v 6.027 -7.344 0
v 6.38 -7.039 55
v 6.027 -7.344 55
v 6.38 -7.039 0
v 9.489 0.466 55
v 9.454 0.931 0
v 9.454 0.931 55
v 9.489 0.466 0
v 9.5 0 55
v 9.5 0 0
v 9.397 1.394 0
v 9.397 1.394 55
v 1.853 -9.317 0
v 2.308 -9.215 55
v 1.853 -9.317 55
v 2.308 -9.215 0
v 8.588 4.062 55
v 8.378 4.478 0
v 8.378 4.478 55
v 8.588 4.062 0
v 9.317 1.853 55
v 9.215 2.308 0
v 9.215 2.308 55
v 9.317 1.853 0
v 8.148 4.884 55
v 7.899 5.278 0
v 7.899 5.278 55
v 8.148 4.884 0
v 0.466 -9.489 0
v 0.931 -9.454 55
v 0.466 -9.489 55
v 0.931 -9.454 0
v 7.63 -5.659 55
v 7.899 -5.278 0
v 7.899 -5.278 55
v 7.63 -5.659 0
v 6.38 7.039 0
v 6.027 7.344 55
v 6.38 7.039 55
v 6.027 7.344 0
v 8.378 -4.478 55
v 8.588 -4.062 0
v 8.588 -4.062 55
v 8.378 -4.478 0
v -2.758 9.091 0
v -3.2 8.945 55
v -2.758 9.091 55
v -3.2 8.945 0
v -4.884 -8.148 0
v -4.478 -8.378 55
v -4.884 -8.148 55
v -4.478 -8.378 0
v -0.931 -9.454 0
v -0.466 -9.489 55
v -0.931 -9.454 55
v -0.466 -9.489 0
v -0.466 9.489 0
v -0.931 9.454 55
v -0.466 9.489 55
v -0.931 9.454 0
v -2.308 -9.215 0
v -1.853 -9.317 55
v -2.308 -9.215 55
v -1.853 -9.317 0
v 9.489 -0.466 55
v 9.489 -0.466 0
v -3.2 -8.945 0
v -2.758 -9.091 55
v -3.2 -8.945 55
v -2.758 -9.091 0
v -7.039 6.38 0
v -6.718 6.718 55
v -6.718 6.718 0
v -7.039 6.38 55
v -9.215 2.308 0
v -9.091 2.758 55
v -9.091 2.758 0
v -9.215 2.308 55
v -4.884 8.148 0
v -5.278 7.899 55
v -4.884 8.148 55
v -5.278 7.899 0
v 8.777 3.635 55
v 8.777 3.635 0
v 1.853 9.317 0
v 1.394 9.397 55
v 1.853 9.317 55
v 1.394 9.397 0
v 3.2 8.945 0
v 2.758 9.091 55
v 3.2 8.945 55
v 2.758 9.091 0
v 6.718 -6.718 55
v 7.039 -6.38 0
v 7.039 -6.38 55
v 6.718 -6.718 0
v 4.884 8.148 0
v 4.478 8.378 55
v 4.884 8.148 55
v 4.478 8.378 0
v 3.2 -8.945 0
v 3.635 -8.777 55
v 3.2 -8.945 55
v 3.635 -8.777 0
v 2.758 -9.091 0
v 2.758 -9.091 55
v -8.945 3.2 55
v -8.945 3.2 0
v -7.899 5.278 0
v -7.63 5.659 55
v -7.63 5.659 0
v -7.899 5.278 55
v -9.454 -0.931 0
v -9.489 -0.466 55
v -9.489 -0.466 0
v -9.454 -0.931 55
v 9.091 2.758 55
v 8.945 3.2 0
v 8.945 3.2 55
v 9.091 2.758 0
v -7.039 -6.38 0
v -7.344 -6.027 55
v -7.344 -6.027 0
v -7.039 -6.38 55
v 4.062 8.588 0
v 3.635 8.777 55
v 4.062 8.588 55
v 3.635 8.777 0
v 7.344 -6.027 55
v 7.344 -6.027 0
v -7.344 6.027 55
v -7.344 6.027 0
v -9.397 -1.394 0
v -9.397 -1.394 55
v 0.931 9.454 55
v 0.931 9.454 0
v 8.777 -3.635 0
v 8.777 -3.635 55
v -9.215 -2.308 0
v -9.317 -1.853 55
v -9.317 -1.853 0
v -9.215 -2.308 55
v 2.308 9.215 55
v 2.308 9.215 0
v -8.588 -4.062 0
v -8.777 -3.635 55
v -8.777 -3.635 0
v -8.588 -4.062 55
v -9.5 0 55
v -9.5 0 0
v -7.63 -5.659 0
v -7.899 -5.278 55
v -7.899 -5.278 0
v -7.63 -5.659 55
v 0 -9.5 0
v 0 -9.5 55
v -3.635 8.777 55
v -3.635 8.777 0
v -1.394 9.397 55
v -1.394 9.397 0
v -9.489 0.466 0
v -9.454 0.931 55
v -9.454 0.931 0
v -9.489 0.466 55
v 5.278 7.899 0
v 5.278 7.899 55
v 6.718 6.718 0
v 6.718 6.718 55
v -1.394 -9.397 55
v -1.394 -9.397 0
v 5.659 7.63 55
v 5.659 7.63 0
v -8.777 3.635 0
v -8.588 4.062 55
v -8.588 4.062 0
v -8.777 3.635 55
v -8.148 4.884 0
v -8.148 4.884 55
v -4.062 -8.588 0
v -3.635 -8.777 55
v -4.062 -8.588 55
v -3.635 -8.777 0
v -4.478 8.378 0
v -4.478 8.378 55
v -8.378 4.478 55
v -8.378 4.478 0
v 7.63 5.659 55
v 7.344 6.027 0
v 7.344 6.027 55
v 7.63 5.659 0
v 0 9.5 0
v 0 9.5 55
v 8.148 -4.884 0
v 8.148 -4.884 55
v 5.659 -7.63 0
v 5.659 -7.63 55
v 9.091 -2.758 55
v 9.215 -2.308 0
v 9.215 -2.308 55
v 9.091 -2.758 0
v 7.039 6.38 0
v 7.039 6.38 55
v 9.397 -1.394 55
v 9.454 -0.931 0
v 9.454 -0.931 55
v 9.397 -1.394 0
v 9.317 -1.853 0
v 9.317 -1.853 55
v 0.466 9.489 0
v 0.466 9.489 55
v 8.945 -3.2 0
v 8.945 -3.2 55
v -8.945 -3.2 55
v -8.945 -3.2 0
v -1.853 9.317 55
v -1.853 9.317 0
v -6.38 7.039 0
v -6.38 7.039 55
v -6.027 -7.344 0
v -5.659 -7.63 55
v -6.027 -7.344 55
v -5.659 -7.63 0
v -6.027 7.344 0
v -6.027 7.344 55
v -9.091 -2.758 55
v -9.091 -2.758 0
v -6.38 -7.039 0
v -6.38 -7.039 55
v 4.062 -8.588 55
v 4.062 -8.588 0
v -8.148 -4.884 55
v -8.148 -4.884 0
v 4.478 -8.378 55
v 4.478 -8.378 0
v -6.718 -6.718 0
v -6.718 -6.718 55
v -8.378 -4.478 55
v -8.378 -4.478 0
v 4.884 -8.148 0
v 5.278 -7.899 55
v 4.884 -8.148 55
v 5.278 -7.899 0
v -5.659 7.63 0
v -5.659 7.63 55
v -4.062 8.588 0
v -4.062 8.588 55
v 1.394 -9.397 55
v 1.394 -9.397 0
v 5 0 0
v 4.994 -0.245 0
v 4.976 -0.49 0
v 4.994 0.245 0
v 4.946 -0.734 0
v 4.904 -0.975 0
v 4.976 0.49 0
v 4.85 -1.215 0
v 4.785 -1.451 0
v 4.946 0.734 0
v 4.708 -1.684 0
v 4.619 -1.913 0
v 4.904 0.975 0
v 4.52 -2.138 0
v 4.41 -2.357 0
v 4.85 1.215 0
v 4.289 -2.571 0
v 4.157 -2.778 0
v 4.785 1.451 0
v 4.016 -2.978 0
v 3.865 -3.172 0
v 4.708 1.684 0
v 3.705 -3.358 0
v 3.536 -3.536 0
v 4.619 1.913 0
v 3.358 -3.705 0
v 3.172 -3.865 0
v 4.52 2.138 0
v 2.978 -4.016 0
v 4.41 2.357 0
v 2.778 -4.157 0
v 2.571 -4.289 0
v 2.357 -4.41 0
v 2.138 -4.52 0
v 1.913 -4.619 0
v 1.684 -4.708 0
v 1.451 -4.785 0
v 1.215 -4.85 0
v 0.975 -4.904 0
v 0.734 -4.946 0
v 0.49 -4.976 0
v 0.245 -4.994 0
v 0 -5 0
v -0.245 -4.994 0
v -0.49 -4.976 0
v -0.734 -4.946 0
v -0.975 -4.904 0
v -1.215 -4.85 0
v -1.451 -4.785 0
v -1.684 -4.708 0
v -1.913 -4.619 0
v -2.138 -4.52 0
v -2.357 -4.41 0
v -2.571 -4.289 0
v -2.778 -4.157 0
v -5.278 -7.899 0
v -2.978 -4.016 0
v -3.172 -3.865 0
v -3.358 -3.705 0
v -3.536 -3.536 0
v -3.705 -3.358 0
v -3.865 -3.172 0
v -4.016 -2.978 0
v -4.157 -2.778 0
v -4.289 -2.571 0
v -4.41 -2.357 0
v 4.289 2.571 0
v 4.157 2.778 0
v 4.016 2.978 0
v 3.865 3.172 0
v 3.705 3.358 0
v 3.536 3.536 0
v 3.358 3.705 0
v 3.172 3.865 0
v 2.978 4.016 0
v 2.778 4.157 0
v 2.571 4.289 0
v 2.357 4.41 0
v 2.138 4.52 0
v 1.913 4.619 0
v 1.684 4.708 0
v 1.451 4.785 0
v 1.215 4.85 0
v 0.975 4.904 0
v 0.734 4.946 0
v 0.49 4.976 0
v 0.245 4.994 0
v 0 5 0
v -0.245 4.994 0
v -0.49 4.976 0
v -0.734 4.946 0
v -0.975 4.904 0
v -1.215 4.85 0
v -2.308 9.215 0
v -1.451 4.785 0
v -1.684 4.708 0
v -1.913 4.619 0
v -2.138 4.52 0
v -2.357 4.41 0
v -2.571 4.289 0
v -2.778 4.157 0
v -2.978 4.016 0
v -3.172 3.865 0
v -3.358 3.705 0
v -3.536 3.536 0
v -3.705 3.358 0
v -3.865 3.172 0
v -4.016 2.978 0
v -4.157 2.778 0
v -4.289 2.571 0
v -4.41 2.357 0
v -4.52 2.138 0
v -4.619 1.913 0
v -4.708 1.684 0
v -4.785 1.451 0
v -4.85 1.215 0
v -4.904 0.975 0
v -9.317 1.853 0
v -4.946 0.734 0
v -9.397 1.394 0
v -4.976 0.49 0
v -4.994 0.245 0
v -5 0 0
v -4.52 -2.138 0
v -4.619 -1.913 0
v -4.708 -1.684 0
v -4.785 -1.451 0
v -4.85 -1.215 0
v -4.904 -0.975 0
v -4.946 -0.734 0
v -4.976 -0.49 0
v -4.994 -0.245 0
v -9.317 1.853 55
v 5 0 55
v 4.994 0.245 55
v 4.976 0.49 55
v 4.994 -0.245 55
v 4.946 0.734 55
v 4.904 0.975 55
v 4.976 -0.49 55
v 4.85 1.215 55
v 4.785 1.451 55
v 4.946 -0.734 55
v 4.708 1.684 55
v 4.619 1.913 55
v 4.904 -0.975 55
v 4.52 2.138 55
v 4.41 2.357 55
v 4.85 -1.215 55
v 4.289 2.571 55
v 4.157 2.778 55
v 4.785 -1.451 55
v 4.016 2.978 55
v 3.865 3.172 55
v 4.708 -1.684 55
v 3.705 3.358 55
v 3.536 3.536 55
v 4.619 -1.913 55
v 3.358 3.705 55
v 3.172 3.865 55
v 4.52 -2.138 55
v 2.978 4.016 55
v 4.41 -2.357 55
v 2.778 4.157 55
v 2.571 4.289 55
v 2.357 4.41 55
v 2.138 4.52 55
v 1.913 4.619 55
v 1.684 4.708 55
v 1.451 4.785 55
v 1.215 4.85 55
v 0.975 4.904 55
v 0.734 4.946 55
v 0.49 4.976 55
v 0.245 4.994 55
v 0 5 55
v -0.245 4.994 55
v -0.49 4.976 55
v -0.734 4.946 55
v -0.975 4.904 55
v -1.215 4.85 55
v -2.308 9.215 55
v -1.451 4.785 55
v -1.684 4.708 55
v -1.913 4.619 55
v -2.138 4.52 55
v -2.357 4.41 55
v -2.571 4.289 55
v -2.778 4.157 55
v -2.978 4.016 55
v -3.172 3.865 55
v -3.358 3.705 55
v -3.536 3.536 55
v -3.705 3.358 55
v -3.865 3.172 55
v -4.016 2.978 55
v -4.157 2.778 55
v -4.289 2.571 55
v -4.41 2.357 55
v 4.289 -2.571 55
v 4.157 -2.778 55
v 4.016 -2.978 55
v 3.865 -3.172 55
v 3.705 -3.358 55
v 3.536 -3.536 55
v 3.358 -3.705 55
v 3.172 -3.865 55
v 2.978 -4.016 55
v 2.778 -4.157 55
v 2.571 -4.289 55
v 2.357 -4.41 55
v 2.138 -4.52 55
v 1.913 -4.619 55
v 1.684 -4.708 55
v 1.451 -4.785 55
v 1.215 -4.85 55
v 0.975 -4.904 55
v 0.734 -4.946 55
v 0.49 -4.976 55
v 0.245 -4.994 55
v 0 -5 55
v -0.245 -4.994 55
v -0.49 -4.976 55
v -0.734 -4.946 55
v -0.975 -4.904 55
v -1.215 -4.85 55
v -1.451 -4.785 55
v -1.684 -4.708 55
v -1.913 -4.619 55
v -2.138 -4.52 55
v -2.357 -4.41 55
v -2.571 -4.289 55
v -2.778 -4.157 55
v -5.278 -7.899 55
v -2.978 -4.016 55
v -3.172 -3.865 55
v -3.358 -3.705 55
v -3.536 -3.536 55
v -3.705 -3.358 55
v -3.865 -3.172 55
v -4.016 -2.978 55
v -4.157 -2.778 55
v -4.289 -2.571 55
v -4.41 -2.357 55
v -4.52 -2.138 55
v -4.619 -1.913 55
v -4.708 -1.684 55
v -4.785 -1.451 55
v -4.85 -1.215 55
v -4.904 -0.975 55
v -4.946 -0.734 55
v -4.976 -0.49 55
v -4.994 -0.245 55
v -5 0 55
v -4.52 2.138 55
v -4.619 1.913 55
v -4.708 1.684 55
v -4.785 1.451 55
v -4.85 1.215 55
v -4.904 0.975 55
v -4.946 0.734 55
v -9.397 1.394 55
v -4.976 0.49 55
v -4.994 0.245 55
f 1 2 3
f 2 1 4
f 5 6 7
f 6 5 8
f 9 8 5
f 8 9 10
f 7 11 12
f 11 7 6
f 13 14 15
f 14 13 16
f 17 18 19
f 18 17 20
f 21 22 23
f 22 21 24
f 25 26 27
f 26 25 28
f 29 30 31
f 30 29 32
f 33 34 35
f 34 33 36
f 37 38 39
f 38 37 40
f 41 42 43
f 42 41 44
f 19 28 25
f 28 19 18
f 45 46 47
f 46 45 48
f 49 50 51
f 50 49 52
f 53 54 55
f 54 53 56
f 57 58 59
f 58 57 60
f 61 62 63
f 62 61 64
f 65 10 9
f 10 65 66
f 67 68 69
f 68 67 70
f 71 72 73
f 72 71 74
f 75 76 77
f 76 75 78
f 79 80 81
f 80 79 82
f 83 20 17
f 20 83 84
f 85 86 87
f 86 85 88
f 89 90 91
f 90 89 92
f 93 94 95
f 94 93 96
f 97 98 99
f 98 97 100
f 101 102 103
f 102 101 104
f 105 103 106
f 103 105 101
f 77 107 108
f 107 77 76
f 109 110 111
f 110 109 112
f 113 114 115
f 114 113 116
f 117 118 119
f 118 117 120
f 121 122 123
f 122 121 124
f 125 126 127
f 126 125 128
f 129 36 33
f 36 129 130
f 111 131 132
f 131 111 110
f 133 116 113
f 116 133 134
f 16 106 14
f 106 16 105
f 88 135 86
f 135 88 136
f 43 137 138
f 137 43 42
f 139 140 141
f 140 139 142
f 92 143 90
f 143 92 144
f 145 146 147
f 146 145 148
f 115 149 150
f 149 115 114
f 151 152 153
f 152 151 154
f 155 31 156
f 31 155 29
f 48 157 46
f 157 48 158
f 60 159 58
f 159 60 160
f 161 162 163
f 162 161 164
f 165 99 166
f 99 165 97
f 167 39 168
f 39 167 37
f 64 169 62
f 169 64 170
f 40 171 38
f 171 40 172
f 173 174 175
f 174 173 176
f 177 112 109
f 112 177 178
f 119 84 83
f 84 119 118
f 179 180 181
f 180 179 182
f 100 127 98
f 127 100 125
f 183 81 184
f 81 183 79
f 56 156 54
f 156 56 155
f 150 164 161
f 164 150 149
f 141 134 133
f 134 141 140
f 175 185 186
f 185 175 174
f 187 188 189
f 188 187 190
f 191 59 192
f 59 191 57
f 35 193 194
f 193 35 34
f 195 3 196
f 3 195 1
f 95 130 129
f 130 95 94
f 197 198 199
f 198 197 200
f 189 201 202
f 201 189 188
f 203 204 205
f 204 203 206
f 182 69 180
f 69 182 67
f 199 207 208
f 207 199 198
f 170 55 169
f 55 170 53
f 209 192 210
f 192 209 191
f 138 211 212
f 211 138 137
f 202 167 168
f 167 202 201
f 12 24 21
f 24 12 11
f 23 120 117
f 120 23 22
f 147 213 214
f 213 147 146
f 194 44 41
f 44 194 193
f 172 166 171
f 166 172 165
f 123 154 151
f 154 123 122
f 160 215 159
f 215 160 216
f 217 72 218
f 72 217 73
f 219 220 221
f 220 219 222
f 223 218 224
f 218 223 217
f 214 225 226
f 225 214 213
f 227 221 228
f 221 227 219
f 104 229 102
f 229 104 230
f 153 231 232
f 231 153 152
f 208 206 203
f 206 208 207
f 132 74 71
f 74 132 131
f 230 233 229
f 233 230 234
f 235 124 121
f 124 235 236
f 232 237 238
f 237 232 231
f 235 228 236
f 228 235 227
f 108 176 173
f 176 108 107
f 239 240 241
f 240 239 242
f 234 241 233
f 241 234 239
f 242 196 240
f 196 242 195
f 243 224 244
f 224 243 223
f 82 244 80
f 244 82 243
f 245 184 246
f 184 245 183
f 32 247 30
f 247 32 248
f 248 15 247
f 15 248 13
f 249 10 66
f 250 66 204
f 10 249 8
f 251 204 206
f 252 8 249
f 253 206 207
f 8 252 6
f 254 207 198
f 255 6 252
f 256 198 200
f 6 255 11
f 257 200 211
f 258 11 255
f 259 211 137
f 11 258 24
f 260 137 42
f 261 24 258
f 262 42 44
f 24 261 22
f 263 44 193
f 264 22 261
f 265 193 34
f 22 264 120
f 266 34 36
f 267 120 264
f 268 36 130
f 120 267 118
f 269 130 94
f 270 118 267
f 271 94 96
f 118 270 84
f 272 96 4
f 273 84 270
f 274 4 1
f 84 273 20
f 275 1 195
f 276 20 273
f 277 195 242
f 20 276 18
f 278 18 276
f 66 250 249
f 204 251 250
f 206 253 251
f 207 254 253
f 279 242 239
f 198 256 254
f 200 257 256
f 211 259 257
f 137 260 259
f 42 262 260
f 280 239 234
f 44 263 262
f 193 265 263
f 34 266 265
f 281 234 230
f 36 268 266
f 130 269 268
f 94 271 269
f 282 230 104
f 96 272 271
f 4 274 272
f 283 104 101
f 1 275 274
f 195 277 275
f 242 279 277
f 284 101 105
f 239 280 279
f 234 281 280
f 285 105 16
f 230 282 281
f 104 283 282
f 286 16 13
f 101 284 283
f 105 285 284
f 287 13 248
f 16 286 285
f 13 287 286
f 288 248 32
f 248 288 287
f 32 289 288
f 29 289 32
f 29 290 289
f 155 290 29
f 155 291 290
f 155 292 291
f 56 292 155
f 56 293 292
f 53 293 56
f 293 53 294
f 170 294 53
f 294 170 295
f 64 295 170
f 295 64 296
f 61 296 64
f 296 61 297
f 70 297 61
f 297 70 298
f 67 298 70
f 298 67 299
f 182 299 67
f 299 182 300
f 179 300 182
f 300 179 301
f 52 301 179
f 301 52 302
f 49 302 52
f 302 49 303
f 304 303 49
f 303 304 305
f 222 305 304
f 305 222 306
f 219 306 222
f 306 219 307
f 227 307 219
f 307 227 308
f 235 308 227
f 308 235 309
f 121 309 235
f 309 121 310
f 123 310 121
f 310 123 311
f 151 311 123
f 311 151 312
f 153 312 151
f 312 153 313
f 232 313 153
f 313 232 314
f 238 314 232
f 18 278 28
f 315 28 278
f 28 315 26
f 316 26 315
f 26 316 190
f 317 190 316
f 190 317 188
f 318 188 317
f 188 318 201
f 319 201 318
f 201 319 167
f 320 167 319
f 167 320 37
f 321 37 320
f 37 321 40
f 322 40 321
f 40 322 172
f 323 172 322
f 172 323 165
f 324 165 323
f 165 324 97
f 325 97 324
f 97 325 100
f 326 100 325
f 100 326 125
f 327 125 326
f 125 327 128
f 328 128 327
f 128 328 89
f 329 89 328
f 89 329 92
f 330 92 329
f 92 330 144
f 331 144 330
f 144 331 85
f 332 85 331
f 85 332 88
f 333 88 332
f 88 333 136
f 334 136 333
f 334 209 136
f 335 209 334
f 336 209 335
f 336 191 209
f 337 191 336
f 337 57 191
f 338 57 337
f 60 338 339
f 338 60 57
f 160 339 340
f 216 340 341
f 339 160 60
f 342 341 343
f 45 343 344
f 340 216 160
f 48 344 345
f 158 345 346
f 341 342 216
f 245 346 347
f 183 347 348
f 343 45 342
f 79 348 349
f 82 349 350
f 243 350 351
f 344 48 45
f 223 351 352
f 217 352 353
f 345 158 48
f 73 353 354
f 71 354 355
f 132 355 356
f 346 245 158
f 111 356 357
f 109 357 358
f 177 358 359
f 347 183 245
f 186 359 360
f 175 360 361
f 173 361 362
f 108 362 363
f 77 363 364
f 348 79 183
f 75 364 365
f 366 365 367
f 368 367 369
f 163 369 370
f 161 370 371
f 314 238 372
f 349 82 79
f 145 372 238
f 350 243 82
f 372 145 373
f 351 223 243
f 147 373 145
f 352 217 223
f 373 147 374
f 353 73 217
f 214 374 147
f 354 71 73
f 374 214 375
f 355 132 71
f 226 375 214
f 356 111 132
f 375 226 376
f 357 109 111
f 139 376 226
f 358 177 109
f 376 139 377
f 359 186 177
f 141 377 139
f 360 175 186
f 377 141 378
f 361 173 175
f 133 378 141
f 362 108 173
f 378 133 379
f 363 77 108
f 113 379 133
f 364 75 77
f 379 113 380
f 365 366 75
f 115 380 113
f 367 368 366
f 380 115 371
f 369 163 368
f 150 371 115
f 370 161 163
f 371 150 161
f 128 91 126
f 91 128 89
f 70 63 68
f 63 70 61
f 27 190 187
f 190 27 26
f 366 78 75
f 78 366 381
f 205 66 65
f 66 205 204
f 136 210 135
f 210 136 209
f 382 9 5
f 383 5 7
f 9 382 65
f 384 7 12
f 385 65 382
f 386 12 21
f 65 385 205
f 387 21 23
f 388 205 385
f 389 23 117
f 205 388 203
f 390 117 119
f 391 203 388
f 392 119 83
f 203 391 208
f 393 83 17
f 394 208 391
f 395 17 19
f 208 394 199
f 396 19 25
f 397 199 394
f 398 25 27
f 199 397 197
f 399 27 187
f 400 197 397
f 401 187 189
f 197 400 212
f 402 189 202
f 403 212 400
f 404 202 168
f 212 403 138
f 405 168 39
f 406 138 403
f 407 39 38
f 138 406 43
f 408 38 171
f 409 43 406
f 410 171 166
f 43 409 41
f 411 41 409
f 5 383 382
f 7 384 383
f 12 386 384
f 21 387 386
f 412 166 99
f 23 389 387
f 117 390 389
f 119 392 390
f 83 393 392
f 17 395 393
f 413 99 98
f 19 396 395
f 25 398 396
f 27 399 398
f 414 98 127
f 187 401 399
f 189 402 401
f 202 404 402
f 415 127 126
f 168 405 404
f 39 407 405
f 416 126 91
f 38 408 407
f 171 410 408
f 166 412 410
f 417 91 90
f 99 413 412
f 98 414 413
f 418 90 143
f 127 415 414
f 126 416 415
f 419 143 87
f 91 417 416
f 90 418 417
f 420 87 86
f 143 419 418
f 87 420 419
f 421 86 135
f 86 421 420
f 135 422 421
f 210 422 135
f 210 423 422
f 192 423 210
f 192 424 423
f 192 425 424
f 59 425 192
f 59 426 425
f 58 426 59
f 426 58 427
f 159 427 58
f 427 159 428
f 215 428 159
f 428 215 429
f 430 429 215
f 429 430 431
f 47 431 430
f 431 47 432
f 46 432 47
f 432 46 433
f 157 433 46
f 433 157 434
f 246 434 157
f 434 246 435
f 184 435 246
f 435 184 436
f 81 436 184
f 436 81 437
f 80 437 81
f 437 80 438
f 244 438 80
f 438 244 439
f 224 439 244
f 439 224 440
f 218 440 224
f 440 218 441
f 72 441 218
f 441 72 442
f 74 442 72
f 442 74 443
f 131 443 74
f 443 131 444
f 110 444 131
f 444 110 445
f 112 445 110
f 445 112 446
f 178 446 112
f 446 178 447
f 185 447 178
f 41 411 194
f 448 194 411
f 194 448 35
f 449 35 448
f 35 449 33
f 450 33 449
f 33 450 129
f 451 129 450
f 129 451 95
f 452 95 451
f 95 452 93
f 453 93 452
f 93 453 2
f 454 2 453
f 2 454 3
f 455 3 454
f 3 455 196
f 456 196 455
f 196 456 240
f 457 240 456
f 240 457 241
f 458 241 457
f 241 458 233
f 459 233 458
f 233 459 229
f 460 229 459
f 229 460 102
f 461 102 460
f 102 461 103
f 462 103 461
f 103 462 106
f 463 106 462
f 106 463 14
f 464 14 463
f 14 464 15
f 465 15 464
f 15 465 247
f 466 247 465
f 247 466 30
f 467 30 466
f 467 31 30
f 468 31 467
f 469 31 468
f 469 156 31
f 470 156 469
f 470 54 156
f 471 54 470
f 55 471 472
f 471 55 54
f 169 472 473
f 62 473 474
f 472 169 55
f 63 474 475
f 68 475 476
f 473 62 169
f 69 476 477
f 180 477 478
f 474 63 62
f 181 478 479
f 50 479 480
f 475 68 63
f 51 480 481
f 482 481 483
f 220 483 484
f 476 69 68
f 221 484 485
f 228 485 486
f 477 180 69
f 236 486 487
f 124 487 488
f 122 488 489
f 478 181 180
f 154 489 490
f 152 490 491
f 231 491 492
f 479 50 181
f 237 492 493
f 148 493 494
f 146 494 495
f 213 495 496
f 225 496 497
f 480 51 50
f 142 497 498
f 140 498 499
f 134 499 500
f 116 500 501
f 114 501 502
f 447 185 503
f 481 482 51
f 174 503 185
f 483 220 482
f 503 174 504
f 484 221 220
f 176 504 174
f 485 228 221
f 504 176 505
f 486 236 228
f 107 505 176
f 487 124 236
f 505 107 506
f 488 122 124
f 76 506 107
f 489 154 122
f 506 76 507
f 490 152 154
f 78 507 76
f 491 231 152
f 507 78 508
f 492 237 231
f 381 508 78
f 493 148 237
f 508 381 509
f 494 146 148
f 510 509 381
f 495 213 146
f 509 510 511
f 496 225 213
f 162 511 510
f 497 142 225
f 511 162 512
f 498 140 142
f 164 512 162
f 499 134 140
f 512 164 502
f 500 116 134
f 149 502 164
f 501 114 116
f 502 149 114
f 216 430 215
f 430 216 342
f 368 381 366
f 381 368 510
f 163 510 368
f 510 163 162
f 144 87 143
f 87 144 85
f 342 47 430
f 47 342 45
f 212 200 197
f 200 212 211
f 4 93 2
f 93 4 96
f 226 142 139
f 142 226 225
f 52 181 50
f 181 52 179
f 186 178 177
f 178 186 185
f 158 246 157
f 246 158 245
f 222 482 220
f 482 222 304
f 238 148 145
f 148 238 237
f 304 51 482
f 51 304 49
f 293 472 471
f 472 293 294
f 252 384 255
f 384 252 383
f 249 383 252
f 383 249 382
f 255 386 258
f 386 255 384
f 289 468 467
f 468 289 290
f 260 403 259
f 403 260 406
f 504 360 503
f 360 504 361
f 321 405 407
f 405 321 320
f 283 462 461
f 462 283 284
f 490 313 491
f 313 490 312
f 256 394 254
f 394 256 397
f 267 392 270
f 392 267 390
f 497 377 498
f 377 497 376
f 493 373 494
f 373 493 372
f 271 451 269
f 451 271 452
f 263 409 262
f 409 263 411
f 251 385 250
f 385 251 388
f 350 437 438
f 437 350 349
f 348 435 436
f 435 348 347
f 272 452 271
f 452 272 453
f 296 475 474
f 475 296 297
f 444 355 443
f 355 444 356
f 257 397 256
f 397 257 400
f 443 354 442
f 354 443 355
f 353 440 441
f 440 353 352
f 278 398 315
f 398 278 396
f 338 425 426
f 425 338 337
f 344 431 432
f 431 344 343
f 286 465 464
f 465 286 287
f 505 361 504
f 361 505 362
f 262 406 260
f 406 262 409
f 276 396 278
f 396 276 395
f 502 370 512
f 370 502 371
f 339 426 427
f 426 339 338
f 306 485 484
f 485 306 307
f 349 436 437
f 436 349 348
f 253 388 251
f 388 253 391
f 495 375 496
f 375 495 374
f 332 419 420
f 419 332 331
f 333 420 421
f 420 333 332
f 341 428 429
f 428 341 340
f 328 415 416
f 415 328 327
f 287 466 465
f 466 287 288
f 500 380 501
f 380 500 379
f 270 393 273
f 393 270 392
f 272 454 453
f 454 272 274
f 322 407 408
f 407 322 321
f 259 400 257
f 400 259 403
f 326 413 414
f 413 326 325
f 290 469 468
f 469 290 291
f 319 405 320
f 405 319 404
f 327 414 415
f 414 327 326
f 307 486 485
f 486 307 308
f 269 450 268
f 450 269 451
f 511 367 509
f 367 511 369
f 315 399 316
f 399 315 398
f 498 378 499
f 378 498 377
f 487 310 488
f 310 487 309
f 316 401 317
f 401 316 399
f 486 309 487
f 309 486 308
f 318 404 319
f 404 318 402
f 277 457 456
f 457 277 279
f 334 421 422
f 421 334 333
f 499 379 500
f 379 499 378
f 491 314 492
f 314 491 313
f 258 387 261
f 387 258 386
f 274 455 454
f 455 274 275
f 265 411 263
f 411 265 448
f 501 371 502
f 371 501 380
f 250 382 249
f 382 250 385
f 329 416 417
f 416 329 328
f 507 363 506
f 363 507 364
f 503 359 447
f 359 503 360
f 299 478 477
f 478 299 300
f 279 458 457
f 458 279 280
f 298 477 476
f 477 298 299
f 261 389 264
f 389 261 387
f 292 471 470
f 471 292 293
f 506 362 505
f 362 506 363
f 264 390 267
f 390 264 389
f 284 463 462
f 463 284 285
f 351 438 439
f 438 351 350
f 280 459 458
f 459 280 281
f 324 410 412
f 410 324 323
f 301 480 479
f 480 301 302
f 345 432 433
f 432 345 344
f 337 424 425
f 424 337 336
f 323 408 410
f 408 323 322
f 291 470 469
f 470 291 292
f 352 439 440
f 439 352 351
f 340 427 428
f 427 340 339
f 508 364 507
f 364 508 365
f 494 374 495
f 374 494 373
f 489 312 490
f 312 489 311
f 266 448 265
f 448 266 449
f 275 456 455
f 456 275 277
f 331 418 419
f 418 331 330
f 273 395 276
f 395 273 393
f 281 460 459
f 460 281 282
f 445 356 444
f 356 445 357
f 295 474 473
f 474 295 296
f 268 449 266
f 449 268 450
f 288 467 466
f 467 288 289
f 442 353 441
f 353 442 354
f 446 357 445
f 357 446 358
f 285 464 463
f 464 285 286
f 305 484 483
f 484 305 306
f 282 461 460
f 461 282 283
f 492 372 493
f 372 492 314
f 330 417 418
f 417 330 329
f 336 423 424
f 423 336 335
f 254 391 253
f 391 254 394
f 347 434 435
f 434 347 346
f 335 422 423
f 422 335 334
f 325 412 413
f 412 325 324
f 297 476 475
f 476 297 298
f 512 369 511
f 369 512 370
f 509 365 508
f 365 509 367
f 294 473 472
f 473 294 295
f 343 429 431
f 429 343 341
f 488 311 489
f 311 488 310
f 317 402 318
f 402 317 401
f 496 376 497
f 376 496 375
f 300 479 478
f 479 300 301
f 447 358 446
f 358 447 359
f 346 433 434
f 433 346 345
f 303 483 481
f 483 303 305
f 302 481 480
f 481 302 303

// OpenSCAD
$fn = 128;

bore_d = 10.0;
outer_d = 19.0;
length = 55.0;

difference() {
  cylinder(d = outer_d, h = length, center = false);
  translate([0, 0, -0.1])
    cylinder(d = bore_d, h = length + 0.2, center = false);
}
